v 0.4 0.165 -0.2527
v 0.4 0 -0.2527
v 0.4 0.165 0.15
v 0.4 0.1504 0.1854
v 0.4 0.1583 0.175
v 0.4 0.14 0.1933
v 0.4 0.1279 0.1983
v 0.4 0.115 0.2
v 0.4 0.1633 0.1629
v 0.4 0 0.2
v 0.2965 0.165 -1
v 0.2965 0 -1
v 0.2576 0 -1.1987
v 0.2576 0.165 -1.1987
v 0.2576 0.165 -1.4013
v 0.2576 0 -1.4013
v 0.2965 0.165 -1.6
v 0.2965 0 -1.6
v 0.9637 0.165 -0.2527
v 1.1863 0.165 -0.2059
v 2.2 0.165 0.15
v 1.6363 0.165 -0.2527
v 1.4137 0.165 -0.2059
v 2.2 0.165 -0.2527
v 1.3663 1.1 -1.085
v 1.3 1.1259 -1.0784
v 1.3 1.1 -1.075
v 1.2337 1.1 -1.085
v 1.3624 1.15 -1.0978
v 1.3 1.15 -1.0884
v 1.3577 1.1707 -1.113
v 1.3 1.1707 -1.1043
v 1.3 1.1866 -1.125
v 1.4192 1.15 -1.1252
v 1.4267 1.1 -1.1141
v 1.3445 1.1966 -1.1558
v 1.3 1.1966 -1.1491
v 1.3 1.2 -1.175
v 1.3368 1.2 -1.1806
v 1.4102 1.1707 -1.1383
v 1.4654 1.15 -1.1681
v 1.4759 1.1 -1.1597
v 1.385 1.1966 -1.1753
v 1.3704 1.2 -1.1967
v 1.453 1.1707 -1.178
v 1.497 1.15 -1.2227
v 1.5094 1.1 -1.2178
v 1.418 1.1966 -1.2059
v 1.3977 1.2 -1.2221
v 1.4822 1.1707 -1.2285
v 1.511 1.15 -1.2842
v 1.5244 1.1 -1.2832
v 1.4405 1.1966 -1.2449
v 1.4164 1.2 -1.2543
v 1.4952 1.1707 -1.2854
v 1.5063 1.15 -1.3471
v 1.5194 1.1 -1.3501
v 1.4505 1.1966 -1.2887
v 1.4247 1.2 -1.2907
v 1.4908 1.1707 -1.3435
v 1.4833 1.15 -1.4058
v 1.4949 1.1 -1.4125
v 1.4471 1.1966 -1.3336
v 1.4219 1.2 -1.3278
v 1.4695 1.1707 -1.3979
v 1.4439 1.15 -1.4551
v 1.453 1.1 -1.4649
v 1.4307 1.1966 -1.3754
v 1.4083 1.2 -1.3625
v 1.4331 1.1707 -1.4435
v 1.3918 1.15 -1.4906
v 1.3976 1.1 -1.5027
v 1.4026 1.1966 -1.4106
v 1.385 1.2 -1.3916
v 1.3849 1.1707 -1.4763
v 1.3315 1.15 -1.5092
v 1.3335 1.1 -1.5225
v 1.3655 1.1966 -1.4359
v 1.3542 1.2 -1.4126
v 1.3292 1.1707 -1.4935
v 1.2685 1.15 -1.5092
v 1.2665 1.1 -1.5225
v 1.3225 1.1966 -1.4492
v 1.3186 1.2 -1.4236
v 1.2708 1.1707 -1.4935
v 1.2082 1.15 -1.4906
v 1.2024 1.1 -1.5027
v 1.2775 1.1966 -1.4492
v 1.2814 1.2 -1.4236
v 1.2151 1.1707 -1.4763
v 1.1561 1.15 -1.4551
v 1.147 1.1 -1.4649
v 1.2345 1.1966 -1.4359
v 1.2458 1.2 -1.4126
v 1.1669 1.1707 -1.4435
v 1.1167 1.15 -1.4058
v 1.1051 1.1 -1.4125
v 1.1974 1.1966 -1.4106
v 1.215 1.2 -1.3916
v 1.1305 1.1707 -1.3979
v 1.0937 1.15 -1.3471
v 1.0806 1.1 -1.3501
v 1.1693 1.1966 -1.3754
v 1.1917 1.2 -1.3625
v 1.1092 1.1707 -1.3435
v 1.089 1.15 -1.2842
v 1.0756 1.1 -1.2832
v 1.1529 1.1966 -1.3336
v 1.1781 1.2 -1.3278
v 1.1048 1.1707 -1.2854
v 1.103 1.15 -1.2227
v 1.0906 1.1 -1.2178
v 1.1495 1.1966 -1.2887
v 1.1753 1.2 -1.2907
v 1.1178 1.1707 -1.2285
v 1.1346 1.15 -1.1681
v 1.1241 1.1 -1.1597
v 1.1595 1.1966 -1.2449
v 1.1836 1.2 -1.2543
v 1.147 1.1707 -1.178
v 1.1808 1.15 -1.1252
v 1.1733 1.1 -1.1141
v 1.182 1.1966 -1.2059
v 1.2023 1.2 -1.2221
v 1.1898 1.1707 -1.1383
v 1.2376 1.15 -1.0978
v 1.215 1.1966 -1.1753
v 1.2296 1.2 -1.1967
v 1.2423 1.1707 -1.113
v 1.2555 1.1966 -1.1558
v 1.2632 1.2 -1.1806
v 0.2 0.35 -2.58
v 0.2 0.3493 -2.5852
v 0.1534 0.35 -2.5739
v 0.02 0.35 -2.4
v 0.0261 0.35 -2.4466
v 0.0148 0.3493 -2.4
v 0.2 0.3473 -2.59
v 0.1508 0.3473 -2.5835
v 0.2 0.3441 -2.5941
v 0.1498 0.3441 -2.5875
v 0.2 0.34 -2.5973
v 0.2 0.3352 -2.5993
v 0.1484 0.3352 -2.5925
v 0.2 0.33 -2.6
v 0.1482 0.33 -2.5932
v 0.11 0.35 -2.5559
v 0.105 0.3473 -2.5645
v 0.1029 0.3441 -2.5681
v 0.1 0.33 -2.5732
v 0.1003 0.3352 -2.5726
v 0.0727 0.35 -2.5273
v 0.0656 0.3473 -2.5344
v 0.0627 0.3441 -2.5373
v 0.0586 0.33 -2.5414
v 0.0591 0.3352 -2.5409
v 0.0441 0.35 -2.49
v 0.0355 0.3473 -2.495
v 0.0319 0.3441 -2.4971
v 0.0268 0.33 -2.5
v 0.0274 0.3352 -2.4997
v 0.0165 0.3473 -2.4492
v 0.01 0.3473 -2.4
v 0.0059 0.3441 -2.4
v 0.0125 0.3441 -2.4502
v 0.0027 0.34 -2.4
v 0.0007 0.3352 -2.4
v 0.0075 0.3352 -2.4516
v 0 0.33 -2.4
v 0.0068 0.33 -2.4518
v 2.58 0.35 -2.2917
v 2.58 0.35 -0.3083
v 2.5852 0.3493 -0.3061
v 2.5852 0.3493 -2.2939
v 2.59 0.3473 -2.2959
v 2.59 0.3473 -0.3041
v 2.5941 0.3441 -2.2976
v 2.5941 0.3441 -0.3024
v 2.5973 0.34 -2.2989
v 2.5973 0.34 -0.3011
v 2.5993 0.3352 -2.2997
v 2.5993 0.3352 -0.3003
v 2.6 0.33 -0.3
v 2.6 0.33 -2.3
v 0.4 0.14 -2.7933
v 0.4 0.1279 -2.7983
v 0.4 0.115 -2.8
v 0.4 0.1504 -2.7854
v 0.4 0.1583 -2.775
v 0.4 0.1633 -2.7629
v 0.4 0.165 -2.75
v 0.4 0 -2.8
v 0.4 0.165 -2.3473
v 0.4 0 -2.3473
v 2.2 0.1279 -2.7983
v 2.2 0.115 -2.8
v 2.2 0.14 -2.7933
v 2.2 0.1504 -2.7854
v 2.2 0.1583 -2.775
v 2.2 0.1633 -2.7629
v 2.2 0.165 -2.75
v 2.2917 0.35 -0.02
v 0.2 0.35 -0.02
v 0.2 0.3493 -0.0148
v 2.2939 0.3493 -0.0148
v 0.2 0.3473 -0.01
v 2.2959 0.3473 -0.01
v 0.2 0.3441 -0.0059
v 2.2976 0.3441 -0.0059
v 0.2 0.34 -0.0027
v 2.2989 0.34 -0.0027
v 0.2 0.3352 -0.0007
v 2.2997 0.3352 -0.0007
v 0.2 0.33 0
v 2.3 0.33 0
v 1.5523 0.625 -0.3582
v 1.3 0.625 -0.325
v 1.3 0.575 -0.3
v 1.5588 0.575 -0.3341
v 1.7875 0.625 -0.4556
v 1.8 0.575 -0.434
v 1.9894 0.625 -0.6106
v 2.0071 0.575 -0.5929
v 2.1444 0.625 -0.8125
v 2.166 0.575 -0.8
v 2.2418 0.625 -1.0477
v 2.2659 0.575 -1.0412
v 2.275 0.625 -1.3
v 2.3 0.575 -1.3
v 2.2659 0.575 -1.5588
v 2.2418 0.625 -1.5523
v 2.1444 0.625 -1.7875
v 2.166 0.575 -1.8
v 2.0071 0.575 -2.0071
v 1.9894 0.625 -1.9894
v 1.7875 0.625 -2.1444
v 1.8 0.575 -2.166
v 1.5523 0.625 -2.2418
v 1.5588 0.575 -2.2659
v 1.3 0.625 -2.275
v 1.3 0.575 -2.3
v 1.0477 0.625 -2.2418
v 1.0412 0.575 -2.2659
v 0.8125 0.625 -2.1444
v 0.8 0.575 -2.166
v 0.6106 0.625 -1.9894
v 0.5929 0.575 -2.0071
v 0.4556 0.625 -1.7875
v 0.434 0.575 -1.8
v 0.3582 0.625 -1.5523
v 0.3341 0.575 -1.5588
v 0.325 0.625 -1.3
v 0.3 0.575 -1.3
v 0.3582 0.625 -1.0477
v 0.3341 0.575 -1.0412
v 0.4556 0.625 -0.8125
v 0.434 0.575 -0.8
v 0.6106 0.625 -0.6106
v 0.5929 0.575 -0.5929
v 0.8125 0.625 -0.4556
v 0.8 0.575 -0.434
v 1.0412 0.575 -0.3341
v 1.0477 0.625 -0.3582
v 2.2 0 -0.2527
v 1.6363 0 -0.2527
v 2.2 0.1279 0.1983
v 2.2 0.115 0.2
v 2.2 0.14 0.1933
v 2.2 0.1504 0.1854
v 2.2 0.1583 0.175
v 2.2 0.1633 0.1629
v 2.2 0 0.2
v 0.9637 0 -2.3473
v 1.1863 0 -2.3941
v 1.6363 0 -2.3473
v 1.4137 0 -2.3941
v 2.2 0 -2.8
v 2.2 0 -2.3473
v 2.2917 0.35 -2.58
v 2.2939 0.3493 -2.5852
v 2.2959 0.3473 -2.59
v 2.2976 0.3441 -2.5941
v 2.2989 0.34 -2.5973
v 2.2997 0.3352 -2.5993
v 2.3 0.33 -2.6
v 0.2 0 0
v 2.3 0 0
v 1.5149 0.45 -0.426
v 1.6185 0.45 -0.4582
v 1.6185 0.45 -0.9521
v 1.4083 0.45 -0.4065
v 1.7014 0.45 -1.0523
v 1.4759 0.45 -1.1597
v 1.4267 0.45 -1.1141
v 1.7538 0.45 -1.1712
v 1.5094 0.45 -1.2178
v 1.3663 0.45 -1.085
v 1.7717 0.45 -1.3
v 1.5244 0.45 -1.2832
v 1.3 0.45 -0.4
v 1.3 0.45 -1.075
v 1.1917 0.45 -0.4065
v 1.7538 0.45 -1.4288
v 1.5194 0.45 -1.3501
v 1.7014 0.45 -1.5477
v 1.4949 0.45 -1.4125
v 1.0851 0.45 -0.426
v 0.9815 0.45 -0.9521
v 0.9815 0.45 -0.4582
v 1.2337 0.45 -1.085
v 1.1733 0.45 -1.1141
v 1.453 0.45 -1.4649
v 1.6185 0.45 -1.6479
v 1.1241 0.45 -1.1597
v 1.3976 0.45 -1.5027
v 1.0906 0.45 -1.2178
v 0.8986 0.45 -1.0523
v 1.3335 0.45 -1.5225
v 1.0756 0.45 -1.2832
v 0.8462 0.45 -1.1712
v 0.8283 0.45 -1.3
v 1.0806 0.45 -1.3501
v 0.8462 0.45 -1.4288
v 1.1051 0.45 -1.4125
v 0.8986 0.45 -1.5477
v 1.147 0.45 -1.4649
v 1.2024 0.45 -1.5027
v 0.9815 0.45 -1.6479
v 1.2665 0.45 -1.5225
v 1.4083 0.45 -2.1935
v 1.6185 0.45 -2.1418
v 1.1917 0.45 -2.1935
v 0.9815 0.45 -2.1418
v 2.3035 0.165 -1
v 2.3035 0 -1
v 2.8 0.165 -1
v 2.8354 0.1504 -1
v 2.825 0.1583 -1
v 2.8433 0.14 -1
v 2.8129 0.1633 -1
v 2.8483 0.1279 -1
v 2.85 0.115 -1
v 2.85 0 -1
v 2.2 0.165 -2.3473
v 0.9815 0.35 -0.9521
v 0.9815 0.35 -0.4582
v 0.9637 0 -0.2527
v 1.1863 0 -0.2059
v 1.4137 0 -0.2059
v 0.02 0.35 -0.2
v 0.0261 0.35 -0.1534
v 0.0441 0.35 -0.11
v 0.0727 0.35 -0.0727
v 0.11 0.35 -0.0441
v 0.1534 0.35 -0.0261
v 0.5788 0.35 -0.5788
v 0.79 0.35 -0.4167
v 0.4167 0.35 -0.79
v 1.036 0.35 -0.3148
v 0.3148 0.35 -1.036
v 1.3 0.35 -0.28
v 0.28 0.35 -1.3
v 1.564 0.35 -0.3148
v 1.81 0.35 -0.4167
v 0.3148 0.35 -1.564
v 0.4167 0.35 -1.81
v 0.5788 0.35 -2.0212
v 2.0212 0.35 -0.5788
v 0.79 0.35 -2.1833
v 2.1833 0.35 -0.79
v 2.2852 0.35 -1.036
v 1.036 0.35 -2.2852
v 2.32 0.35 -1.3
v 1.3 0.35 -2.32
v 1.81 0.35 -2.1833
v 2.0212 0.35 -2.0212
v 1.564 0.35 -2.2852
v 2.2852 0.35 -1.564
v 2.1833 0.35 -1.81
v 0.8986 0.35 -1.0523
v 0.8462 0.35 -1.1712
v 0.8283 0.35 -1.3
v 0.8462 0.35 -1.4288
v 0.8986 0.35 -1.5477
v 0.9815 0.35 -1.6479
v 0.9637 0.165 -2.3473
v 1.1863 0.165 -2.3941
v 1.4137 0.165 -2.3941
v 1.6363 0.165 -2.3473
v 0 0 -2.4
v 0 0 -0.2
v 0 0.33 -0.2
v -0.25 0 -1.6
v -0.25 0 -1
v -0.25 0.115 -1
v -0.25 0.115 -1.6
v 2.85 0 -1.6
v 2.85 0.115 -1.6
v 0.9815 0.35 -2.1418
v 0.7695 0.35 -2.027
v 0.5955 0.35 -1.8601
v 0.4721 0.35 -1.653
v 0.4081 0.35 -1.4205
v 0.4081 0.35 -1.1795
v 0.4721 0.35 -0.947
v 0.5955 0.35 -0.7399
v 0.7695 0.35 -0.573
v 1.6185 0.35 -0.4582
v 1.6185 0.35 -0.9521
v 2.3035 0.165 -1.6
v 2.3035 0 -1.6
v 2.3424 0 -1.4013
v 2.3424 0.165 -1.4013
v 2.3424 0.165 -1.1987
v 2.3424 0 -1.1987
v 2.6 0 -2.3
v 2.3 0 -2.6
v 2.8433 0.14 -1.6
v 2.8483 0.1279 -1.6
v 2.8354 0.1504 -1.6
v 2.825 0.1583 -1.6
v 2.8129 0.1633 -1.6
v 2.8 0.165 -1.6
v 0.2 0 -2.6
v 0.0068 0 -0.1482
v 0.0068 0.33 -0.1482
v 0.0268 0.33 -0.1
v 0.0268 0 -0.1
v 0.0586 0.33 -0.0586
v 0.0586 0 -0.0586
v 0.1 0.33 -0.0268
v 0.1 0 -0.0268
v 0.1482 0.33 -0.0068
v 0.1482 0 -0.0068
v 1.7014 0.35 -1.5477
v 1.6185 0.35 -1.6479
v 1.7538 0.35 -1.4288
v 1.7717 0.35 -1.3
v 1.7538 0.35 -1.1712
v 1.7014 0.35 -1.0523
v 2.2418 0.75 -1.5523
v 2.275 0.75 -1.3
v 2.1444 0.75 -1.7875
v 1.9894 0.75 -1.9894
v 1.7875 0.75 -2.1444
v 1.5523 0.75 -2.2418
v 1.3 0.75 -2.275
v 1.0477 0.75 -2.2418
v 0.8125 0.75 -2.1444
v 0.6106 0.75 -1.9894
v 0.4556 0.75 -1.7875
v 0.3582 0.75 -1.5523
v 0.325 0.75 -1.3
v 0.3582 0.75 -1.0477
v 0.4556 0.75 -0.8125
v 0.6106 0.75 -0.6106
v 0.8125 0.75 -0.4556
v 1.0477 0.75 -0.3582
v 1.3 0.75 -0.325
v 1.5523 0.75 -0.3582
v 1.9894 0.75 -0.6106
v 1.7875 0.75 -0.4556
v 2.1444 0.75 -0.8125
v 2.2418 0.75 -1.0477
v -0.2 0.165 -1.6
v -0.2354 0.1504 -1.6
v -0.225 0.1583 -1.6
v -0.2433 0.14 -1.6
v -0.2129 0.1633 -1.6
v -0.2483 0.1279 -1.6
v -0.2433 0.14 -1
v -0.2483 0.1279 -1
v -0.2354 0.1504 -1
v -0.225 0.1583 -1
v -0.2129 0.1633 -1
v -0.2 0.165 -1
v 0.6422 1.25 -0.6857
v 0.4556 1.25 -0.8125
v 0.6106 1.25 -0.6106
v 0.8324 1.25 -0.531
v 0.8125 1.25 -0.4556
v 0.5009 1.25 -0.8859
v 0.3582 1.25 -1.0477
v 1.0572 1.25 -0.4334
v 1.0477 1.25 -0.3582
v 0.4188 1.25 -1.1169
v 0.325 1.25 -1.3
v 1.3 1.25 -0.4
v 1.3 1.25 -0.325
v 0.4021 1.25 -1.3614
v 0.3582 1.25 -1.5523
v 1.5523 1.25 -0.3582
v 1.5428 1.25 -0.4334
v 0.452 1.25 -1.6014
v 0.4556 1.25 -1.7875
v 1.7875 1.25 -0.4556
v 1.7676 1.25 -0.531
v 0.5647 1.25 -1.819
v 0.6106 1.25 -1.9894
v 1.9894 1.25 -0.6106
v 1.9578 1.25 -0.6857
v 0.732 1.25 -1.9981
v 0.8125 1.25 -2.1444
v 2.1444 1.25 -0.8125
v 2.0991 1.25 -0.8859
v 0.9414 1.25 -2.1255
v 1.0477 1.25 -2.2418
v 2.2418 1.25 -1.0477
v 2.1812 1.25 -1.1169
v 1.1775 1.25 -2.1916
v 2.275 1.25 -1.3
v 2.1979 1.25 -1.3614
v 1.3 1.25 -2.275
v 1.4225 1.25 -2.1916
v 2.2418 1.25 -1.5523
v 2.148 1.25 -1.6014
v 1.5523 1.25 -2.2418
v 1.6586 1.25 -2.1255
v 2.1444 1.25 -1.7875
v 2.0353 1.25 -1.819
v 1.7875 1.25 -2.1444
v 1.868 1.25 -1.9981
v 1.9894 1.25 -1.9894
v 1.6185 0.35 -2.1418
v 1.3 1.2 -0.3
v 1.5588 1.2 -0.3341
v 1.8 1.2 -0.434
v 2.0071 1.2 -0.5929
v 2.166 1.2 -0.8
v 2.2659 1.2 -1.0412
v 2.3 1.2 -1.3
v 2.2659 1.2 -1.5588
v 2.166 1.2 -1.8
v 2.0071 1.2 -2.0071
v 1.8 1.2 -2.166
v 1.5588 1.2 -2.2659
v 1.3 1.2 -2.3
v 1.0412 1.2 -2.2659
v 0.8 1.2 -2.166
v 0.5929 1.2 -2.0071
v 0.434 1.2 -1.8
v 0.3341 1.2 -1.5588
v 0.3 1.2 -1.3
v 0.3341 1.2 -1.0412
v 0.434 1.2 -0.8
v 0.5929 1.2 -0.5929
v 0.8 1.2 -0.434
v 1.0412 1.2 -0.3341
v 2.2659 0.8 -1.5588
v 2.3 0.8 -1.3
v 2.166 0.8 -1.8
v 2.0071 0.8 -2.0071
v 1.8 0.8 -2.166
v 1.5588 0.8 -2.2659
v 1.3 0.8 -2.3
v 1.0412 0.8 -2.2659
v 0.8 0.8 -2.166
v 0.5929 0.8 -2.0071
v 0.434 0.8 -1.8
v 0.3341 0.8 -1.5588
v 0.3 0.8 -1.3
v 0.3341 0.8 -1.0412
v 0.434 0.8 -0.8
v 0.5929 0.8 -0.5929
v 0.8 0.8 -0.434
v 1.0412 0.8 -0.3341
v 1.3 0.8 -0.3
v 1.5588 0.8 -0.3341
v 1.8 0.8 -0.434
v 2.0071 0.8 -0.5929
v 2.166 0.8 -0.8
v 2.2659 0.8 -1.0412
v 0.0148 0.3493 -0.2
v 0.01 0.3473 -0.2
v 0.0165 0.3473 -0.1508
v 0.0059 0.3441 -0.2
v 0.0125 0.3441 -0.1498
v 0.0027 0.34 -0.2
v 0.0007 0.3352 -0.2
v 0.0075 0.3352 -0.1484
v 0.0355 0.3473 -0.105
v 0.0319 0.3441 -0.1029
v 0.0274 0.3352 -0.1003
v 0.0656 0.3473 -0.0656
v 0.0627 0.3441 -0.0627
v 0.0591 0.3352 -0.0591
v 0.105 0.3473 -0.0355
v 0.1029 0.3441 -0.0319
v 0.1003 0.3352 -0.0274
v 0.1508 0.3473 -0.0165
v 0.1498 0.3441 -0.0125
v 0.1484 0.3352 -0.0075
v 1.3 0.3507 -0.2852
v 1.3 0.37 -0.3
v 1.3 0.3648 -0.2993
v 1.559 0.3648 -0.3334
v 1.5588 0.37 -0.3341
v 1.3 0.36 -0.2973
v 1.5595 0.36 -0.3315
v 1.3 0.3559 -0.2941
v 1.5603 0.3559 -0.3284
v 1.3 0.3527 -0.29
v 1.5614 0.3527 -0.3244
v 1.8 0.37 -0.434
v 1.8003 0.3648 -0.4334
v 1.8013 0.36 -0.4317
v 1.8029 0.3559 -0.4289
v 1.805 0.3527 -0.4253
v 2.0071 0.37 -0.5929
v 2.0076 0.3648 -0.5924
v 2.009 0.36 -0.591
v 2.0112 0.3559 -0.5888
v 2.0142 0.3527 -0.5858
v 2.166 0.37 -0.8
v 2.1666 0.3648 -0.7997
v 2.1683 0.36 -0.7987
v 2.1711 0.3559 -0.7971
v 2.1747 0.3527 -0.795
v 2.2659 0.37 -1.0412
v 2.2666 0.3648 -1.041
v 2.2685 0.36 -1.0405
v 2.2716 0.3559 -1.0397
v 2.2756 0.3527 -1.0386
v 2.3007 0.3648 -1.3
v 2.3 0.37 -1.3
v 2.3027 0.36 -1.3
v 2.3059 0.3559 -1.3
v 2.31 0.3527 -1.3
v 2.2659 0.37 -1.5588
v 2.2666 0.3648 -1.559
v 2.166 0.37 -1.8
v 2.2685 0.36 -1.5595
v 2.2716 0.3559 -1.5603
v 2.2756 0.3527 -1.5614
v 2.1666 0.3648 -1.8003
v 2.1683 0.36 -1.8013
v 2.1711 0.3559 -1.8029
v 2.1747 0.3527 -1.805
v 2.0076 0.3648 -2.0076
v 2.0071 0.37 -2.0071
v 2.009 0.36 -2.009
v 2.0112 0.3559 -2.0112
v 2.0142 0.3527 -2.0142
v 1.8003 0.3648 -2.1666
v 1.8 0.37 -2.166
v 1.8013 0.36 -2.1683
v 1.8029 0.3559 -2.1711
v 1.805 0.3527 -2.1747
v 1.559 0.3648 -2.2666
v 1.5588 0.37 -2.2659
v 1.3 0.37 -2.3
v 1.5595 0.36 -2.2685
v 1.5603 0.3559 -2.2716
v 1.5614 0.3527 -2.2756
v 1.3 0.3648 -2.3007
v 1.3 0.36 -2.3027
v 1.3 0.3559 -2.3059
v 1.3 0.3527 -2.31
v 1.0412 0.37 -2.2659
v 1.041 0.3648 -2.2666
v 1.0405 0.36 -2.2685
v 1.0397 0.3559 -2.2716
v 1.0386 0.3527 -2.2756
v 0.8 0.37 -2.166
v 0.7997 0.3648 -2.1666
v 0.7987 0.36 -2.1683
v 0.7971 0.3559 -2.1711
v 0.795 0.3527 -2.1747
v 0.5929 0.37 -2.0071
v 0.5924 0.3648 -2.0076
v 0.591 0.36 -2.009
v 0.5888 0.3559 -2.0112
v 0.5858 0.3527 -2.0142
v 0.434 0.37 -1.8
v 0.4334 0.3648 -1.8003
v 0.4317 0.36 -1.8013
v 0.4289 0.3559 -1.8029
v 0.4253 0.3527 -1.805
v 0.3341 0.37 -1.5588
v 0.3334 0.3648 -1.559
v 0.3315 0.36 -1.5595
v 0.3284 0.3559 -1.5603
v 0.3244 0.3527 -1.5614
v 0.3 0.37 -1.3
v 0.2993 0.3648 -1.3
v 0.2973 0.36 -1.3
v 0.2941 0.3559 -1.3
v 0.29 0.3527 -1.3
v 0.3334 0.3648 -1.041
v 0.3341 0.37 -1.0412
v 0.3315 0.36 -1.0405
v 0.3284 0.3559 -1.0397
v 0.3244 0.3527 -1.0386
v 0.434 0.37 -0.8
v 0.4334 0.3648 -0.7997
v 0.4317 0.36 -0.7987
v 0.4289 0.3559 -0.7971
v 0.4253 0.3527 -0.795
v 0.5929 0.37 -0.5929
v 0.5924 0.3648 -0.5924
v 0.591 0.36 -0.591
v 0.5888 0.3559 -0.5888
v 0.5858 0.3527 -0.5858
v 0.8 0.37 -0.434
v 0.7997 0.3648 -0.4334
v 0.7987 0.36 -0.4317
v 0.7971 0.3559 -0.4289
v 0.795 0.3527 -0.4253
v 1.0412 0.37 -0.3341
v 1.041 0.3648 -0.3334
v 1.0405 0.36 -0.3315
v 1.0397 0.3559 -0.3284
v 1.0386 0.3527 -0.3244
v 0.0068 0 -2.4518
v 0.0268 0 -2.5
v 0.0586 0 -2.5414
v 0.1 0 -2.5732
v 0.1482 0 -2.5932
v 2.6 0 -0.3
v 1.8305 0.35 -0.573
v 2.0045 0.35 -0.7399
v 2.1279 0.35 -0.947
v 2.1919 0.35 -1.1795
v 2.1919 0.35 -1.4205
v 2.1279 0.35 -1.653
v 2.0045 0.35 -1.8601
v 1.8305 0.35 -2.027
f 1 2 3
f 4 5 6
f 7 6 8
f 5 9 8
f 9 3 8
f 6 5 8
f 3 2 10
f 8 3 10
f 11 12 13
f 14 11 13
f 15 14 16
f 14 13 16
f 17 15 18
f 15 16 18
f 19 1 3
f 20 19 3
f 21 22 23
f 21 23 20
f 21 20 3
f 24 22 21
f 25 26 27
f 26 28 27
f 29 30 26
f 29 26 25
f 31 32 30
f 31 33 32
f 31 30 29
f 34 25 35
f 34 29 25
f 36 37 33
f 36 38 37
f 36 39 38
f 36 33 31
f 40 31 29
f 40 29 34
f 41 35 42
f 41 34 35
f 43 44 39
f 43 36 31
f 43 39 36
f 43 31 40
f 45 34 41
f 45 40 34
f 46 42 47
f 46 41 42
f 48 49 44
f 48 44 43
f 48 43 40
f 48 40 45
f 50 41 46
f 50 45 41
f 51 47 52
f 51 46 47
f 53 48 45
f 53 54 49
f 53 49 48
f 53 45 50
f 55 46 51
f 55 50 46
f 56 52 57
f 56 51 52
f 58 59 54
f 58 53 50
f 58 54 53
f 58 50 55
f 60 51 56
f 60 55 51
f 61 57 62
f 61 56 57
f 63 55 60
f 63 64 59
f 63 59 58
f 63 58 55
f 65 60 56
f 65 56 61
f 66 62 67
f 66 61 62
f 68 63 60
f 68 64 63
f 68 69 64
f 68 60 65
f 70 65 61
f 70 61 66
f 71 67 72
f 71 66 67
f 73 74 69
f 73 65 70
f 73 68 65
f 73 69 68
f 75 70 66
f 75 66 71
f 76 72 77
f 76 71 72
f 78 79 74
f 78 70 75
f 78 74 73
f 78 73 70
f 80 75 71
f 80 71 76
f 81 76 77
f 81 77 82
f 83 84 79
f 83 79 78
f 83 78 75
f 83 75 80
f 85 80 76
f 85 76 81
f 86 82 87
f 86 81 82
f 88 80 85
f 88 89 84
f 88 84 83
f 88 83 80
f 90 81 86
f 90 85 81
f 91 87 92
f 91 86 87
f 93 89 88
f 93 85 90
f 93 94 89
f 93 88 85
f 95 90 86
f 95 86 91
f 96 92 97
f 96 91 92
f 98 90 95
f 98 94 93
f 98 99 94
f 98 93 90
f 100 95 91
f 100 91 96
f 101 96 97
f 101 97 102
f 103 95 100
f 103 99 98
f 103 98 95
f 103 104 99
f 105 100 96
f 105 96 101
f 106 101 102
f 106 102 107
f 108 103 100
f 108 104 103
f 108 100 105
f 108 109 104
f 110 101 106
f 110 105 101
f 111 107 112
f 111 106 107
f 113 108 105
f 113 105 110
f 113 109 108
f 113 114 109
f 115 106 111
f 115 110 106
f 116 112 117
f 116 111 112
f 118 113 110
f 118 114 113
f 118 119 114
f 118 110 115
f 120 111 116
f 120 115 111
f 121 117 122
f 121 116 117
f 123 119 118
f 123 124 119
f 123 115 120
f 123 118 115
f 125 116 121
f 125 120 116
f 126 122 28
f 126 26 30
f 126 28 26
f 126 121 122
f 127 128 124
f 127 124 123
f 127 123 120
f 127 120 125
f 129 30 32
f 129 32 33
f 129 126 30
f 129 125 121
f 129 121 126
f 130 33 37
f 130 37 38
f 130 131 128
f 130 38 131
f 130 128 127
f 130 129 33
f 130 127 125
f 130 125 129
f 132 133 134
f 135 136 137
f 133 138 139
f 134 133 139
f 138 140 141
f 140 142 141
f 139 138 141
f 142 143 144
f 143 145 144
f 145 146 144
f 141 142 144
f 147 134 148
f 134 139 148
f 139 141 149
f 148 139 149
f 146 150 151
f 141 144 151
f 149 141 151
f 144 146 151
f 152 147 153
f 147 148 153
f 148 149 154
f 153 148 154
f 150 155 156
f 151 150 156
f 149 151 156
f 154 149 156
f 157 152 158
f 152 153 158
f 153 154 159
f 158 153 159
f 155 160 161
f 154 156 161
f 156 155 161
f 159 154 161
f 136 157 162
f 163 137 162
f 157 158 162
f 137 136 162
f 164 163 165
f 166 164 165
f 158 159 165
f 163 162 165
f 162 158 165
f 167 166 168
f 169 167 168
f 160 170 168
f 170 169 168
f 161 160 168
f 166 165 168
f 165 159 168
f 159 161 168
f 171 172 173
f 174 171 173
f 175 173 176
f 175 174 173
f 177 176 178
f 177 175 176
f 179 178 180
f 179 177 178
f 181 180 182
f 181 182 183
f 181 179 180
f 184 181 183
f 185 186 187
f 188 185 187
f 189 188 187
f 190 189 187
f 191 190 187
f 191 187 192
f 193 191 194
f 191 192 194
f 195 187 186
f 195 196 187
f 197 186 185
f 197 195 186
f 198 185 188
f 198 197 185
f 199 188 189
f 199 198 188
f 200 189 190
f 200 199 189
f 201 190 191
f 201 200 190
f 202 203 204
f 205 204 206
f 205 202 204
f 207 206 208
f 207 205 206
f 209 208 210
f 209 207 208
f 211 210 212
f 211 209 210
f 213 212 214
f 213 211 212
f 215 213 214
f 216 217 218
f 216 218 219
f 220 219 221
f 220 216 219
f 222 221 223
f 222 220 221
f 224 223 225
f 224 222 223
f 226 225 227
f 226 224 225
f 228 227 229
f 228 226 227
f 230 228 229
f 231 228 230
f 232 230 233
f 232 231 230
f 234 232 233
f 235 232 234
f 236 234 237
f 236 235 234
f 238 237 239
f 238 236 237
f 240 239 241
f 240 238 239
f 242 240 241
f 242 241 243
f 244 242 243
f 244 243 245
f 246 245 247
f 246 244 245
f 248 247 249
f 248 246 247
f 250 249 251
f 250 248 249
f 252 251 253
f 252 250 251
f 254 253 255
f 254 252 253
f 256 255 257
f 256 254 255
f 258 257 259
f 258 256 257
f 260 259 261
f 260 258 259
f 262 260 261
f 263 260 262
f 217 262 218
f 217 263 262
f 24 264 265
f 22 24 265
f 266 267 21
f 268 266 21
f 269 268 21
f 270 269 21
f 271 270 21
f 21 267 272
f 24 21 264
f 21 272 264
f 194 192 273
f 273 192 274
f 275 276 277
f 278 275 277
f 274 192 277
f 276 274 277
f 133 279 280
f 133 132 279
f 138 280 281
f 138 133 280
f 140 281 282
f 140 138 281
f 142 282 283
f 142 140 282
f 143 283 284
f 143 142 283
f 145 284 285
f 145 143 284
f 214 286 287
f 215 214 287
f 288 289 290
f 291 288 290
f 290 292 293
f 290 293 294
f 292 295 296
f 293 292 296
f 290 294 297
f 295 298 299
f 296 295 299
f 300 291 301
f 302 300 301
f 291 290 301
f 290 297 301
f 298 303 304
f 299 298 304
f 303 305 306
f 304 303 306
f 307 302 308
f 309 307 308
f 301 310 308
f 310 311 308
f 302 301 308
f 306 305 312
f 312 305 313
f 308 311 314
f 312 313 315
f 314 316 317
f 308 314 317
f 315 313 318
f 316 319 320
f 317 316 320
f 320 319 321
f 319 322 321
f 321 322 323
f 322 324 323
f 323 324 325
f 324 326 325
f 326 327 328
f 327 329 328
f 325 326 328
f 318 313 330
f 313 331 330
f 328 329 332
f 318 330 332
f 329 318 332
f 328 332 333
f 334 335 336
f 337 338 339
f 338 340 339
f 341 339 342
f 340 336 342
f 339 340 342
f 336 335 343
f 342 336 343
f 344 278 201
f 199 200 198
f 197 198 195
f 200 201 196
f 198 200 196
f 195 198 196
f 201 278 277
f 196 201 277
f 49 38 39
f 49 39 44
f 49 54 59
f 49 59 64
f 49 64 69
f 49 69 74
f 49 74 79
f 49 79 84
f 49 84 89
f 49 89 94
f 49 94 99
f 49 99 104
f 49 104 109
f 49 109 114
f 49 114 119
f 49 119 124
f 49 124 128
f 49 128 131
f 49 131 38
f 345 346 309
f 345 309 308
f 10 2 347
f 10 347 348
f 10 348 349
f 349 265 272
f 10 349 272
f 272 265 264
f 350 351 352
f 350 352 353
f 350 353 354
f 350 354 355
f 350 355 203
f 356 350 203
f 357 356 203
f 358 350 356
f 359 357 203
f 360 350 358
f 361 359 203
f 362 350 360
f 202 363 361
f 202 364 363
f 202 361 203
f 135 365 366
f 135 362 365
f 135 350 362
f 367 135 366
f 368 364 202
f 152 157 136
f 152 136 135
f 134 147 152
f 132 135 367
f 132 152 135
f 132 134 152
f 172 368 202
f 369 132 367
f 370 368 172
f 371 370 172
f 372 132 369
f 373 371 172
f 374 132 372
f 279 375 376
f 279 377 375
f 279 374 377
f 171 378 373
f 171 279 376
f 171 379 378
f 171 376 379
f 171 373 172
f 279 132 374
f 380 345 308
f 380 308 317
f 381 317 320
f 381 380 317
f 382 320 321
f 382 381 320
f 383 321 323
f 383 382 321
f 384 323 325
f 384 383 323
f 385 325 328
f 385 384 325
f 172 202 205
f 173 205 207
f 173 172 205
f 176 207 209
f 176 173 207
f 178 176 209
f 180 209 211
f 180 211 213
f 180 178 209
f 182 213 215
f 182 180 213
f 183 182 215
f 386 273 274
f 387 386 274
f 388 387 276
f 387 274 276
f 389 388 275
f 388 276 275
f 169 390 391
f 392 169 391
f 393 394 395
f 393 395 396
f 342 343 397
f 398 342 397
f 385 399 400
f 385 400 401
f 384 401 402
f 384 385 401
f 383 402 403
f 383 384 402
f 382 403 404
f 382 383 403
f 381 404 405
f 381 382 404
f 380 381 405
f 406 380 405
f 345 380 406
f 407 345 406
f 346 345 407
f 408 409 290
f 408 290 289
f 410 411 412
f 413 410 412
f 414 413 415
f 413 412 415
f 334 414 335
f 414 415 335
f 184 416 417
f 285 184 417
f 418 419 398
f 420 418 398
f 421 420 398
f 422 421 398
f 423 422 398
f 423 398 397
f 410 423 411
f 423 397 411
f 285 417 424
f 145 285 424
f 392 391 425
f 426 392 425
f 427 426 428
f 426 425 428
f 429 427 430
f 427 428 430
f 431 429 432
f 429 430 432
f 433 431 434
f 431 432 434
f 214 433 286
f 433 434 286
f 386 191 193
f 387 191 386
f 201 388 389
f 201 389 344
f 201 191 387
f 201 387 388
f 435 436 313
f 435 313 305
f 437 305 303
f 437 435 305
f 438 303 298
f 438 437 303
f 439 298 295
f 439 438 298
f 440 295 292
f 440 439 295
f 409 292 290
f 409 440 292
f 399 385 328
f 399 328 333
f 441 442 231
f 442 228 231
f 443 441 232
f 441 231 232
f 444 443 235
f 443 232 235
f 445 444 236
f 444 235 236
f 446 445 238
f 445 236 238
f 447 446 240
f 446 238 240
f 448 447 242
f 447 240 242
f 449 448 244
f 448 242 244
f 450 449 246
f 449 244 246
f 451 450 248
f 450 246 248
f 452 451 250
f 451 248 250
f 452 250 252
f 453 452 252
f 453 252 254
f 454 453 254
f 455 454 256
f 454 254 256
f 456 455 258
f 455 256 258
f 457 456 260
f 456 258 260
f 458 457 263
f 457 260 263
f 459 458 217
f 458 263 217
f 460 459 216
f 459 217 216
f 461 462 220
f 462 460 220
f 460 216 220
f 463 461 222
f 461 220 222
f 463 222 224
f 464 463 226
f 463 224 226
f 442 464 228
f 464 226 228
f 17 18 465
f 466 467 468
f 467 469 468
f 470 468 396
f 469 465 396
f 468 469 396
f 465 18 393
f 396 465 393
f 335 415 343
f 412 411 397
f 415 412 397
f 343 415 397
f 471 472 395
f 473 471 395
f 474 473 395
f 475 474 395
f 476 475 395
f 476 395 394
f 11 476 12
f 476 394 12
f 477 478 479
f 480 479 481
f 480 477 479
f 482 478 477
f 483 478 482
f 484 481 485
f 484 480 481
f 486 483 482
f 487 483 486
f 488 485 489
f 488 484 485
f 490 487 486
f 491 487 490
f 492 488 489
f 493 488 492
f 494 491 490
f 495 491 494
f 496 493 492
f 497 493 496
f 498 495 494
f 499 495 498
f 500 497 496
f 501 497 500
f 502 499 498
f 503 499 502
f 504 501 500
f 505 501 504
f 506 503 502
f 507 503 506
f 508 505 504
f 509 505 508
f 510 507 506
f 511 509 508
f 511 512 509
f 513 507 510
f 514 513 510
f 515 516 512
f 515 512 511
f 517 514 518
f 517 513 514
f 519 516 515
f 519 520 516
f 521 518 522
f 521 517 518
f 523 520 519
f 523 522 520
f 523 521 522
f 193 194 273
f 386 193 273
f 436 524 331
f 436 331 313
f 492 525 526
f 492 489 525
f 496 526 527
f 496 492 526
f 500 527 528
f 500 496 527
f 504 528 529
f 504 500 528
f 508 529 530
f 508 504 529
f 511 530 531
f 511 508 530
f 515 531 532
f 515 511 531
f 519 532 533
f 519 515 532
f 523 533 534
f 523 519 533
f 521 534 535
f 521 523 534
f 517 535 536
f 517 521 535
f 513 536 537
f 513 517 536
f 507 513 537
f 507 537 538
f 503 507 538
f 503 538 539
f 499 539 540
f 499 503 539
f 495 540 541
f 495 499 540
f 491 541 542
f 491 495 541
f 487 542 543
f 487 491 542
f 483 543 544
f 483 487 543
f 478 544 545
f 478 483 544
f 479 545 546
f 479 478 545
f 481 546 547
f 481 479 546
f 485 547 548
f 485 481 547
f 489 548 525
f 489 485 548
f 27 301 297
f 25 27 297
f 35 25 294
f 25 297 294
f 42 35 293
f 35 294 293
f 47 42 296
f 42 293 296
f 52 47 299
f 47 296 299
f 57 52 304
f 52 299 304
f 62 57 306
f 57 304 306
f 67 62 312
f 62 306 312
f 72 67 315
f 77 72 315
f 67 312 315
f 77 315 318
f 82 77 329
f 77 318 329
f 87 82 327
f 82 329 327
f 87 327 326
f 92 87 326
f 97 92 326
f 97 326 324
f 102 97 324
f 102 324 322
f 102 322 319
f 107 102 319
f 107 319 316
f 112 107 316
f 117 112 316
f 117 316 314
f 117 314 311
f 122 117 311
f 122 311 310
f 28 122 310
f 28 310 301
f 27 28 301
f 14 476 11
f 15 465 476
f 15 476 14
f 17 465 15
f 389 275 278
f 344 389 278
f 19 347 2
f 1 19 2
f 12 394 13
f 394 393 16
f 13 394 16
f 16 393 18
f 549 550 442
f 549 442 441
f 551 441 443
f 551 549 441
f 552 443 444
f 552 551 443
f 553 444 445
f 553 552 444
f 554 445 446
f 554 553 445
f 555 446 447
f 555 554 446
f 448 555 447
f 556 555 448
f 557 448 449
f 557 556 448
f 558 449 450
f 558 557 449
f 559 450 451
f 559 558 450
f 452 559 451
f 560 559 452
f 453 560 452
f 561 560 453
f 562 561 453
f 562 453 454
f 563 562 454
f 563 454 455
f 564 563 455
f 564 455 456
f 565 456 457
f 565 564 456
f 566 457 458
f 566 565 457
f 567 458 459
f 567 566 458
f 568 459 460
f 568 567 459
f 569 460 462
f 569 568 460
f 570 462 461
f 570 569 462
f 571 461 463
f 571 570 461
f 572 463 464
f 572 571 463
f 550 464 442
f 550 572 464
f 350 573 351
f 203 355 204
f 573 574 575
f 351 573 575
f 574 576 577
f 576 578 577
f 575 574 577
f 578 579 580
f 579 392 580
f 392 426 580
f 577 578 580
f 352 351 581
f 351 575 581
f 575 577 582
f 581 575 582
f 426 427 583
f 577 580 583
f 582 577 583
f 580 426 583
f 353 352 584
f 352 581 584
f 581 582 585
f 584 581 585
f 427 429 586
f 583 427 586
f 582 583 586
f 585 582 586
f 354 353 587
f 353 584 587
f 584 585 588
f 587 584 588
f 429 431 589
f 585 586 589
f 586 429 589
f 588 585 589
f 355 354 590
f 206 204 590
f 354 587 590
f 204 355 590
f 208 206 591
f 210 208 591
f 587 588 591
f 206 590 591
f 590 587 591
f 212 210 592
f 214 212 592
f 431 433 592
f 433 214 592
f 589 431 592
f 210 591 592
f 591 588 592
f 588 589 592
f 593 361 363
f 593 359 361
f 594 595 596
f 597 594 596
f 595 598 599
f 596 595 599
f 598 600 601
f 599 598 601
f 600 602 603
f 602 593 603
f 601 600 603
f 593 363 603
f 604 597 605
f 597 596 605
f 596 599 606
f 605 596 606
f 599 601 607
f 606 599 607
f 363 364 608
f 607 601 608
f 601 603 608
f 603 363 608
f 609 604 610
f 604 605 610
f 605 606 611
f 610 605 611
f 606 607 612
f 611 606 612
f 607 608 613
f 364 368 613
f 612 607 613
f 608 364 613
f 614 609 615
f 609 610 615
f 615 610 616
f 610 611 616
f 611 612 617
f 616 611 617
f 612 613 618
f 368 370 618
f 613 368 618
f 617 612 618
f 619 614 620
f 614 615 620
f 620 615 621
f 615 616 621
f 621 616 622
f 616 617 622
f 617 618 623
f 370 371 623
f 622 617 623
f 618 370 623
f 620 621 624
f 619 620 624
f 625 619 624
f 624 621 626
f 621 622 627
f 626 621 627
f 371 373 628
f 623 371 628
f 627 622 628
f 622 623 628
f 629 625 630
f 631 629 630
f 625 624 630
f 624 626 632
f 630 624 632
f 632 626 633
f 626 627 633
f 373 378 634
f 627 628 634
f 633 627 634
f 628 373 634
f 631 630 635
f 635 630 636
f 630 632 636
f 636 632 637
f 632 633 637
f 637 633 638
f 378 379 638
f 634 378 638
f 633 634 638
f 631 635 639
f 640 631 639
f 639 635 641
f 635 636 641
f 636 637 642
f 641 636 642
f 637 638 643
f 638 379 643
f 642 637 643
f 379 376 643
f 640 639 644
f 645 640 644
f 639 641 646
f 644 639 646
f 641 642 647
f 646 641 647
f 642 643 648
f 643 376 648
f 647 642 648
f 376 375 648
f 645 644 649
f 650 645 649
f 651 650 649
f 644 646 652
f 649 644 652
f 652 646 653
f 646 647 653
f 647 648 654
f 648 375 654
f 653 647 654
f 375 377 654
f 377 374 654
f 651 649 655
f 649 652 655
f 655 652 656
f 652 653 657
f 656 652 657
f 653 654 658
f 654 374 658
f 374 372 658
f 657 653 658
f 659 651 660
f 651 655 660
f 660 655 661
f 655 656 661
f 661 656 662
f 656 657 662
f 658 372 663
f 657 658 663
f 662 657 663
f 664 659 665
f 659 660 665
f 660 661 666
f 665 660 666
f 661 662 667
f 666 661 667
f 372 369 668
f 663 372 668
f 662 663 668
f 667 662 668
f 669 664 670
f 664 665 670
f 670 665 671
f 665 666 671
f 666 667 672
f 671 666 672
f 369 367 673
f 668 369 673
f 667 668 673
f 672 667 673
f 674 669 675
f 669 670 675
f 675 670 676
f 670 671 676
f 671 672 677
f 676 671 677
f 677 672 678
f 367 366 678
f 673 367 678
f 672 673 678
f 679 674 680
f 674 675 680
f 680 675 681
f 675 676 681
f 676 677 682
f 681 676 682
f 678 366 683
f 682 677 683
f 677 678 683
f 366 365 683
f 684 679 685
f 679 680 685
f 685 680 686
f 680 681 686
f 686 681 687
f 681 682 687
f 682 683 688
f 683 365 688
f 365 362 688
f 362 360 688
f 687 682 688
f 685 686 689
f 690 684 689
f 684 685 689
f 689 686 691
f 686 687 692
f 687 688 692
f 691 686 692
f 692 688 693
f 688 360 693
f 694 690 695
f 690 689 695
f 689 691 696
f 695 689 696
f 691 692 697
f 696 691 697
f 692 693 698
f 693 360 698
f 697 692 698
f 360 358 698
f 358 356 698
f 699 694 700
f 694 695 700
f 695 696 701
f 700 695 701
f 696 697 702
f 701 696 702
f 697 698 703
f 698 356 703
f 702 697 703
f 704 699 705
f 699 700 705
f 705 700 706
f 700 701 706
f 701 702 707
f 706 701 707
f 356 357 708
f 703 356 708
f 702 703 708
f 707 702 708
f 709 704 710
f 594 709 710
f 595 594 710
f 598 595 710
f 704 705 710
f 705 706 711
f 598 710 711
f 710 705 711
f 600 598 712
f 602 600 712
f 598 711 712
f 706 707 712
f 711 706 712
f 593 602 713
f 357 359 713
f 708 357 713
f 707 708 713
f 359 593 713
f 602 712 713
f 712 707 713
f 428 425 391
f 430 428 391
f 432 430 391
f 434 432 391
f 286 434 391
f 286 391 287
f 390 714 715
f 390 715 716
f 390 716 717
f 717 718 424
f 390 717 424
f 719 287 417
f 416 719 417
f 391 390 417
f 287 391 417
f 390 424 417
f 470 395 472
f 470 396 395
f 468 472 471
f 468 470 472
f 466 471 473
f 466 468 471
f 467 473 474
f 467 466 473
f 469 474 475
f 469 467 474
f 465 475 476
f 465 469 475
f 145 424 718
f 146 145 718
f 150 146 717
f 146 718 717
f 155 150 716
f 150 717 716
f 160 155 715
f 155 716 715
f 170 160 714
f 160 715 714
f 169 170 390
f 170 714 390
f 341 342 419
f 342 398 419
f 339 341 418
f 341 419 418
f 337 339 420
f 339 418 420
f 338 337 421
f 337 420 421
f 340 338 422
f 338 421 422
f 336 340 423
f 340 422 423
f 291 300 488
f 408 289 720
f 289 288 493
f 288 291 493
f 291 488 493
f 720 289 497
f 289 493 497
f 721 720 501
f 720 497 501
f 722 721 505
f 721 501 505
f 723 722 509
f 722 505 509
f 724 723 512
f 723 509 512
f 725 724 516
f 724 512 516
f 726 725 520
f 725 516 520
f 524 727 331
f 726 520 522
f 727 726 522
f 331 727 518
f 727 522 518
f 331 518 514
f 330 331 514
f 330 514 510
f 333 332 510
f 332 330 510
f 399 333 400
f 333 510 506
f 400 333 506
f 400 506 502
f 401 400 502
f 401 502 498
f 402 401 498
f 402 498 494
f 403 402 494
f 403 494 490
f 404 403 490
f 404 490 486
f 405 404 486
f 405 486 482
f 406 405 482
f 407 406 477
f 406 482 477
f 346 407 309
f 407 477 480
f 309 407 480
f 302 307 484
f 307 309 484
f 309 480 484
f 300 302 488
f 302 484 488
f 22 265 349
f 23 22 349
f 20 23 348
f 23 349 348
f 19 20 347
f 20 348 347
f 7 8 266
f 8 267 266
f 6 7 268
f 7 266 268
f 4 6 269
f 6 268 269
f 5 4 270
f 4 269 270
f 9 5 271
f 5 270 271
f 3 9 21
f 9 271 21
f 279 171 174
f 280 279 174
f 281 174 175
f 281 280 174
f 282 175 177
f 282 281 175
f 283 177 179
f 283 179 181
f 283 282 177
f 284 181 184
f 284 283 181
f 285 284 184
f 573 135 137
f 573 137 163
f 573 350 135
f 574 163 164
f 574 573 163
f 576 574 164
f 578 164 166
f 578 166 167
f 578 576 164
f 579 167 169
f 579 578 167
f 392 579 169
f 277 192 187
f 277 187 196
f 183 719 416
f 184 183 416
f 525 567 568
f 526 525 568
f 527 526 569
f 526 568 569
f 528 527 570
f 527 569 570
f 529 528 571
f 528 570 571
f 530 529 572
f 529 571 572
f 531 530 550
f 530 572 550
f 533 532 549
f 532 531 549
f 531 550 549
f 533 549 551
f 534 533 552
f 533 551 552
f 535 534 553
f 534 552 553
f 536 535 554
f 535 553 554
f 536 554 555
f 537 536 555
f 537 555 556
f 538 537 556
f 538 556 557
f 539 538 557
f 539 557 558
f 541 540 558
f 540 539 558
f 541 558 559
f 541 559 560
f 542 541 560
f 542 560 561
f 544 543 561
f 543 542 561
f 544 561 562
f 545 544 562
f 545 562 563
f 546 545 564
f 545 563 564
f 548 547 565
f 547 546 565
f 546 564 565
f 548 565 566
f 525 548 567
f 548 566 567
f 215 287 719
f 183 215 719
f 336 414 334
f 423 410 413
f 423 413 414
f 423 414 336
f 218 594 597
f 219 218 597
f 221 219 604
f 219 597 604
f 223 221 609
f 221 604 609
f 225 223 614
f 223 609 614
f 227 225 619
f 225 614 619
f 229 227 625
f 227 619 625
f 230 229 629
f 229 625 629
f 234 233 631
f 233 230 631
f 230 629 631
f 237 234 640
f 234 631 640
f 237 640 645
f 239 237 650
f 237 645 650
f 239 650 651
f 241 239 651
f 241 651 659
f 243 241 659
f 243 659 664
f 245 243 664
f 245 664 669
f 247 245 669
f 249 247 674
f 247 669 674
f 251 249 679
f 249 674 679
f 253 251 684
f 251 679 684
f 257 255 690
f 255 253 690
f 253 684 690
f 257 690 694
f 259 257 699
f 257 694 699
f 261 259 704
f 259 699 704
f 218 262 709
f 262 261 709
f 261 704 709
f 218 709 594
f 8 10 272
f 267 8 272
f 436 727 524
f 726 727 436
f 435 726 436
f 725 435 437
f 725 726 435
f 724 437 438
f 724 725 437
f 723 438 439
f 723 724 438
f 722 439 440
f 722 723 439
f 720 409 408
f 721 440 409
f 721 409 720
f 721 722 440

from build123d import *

# Parameters (mm, degrees)
SKETCH1_W           = 1.8
SKETCH1_H           = 0.2
SKETCH1_W_2         = 0.25
SKETCH1_H_2         = 0.6
BOSS_EXTRUDE1_DEPTH = 0.165
BOSS_EXTRUDE2_DEPTH = 0.35
SKETCH2_R           = 1
BOSS_EXTRUDE3_DEPTH = 0.225
SKETCH4_R           = 0.975
SKETCH5_R           = 0.975
SKETCH6_R           = 1
SKETCH7_R           = 1
BOSS_EXTRUDE4_DEPTH = 0.4
SKETCH8_R           = 0.975
SKETCH9_R           = 0.9
CUT_EXTRUDE1_DEPTH  = 0.9
SKETCH10_R          = 0.225
BOSS_EXTRUDE5_DEPTH = 0.85
BOSS_EXTRUDE6_DEPTH = 0.1
FILLET1_R           = 0.05
FILLET2_R           = 0.05
FILLET3_R           = 0.05
FILLET4_R           = 0.05
FILLET5_R           = 0.02
FILLET6_R           = 0.1


# Read off the part's stored shape, not the designer's step: Boss-Extrude2
with BuildPart() as part:
    # Sketch1 → Boss-Extrude1 (new body)
    with BuildSketch(Plane(origin=(0, 0, 0), x_dir=(1, 0, 0), z_dir=(0, 1, 0))):
        with Locations((1.3, -0.1)):
            Rectangle(SKETCH1_W, SKETCH1_H)
        with Locations((2.725, 1.3)):
            Rectangle(SKETCH1_W_2, SKETCH1_H_2)
        with Locations((1.3, 2.7)):
            Rectangle(SKETCH1_W, SKETCH1_H)
        with Locations((-0.125, 1.3)):
            Rectangle(SKETCH1_W_2, SKETCH1_H_2)
        with BuildLine():
            Line((2.303450249, 1), (2.6, 1))
            Line((2.6, 1), (2.6, 1.6))
            Line((2.6, 1.6), (2.303450249, 1.6))
            ThreePointArc((2.303450249, 1.6), (2.347335859, 1.3), (2.303450249, 1))
        make_face()
        with BuildLine():
            Line((2.2, 2.6), (0.4, 2.6))
            Line((0.4, 2.6), (0.4, 2.347335859))
            Line((0.4, 2.347335859), (0.963715005, 2.347335859))
            ThreePointArc((0.963715005, 2.347335859), (1.3, 2.4), (1.636284995, 2.347335859))
            Line((1.636284995, 2.347335859), (2.2, 2.347335859))
            Line((2.2, 2.347335859), (2.2, 2.6))
        make_face()
        with BuildLine():
            Line((0.4, 0.252664141), (0.4, 0))
            Line((0.4, 0), (2.2, 0))
            Line((2.2, 0), (2.2, 0.252664141))
            Line((2.2, 0.252664141), (1.636284995, 0.252664141))
            ThreePointArc((1.636284995, 0.252664141), (1.3, 0.2), (0.963715005, 0.252664141))
            Line((0.963715005, 0.252664141), (0.4, 0.252664141))
        make_face()
        with BuildLine():
            Line((0, 1.6), (0, 1))
            Line((0, 1), (0.296549751, 1))
            ThreePointArc((0.296549751, 1), (0.252664141, 1.3), (0.296549751, 1.6))
            Line((0.296549751, 1.6), (0, 1.6))
        make_face()
    extrude(amount=BOSS_EXTRUDE1_DEPTH)

    # Fillet1
    fillet1_edges = [part.edges().sort_by_distance(p)[0] for p in [
        (1.3, 0.165, -2.8),
    ]]
    fillet(fillet1_edges, radius=FILLET1_R)

    # Fillet2
    fillet2_edges = [part.edges().sort_by_distance(p)[0] for p in [
        (2.85, 0.165, -1.3),
    ]]
    fillet(fillet2_edges, radius=FILLET2_R)

    # Fillet3
    fillet3_edges = [part.edges().sort_by_distance(p)[0] for p in [
        (-0.25, 0.165, -1.3),
    ]]
    fillet(fillet3_edges, radius=FILLET3_R)

    # Fillet4
    fillet4_edges = [part.edges().sort_by_distance(p)[0] for p in [
        (1.3, 0.165, 0.2),
    ]]
    fillet(fillet4_edges, radius=FILLET4_R)


with BuildPart() as body_2:
    # Boss-Extrude2 outline → Boss-Extrude2 (new body)
    with BuildSketch(Plane(origin=(0, 0, 0), x_dir=(1, 0, 0), z_dir=(0, 1, 0))):
        with BuildLine():
            Line((0.2, 0), (2.3, 0))
            Line((2.3, 0), (2.6, 0.3))
            Line((2.6, 0.3), (2.6, 2.3))
            Line((2.6, 2.3), (2.3, 2.6))
            Line((2.3, 2.6), (0.2, 2.6))
            ThreePointArc((0.2, 2.6), (0.058578644, 2.541421356), (0, 2.4))
            Line((0, 2.4), (0, 0.2))
            ThreePointArc((0, 0.2), (0.058578644, 0.058578644), (0.2, 0))
        make_face()
    extrude(amount=BOSS_EXTRUDE2_DEPTH)

    # Sketch2 → Boss-Extrude3 (add)
    with BuildSketch(Plane(origin=(0, 0.35, 0), x_dir=(1, 0, 0), z_dir=(0, 1, 0))):
        with Locations(Location((1.3, 1.3, 0), (0, 0, 270))):
            Circle(SKETCH2_R)
    extrude(amount=BOSS_EXTRUDE3_DEPTH)

    # Sketch4 → section 1 of loft1
    with BuildSketch(Plane(origin=(0, 0.625, 0), x_dir=(1, 0, 0), z_dir=(0, 1, 0)), mode=Mode.PRIVATE) as loft1_s1:
        with Locations((1.3, 1.3)):
            Circle(SKETCH4_R)
    # loft up to a face of the part (loft1)
    loft([Face(Wire([body_2.edges().sort_by_distance((2.028968627, 0.575, -1.984547106))[0]])), loft1_s1.sketch])

    # Sketch5 → section 0 of loft2
    with BuildSketch(Plane(origin=(0, 0.75, 0), x_dir=(1, 0, 0), z_dir=(0, 1, 0)), mode=Mode.PRIVATE) as loft2_s0:
        with Locations((1.3, 1.3)):
            Circle(SKETCH5_R)
    # loft up to a face of the part (loft2)
    loft([loft2_s0.sketch, Face(Wire([body_2.edges().sort_by_distance((2.010744412, 0.625, -1.967433428))[0]]))])

    # Sketch6 → section 1 of loft3
    with BuildSketch(Plane(origin=(0, 0.8, 0), x_dir=(1, 0, 0), z_dir=(0, 1, 0)), mode=Mode.PRIVATE) as loft3_s1:
        with Locations((1.3, 1.3)):
            Circle(SKETCH6_R)
    # loft up to a face of the part (loft3)
    loft([Face(Wire([body_2.edges().sort_by_distance((0.632566572, 0.75, -2.010744412))[0]])), loft3_s1.sketch])

    # Sketch7 → Boss-Extrude4 (add)
    with BuildSketch(Plane(origin=(0, 0.8, 0), x_dir=(1, 0, 0), z_dir=(0, 1, 0))):
        with Locations(Location((1.3, 1.3, 0), (0, 0, 270))):
            Circle(SKETCH7_R)
    extrude(amount=BOSS_EXTRUDE4_DEPTH)

    # Sketch8 → section 1 of loft5
    with BuildSketch(Plane(origin=(0, 1.25, 0), x_dir=(1, 0, 0), z_dir=(0, 1, 0)), mode=Mode.PRIVATE) as loft5_s1:
        with Locations((1.3, 1.3)):
            Circle(SKETCH8_R)
    # loft up to a face of the part (loft5)
    loft([Face(Wire([body_2.edges().sort_by_distance((2.028968627, 1.2, -1.984547106))[0]])), loft5_s1.sketch])

    # Sketch9 → Cut-Extrude1 (cut)
    with BuildSketch(Plane(origin=(0, 1.25, 0), x_dir=(1, 0, 0), z_dir=(0, 1, 0))):
        with Locations(Location((1.3, 1.3, 0), (0, 0, 270))):
            Circle(SKETCH9_R)
    extrude(amount=-CUT_EXTRUDE1_DEPTH, mode=Mode.SUBTRACT)

    # Sketch10 → Boss-Extrude5 (add)
    with BuildSketch(Plane(origin=(0, 0.35, 0), x_dir=(1, 0, 0), z_dir=(0, 1, 0))):
        with Locations(Location((1.3, 1.3, 0), (0, 0, 270))):
            Circle(SKETCH10_R)
    extrude(amount=BOSS_EXTRUDE5_DEPTH)

    # Sketch11 → Boss-Extrude6 (add)
    with BuildSketch(Plane(origin=(0, 0.35, 0), x_dir=(1, 0, 0), z_dir=(0, 1, 0))):
        with BuildLine():
            Line((1.618502888, 0.952098493), (1.618502888, 0.458242368))
            ThreePointArc((1.618502888, 0.458242368), (1.3, 0.4), (0.981497112, 0.458242368))
            Line((0.981497112, 0.458242368), (0.981497112, 0.952098493))
            ThreePointArc((0.981497112, 0.952098493), (0.828322623, 1.3), (0.981497112, 1.647901507))
            Line((0.981497112, 1.647901507), (0.981497112, 2.141757632))
            ThreePointArc((0.981497112, 2.141757632), (1.3, 2.2), (1.618502888, 2.141757632))
            Line((1.618502888, 2.141757632), (1.618502888, 1.647901507))
            ThreePointArc((1.618502888, 1.647901507), (1.771677377, 1.3), (1.618502888, 0.952098493))
        make_face()
    extrude(amount=BOSS_EXTRUDE6_DEPTH)

    # Fillet5
    fillet5_edges = [body_2.edges().sort_by_distance(p)[0] for p in [
        (2.45, 0.35, -0.15),
        (2.6, 0.35, -1.3),
        (2.45, 0.35, -2.45),
        (1.25, 0.35, -2.6),
        (0.058578644, 0.35, -2.541421356),
        (1.3, 0.35, -2.3),
        (1.25, 0.35, 0),
        (0, 0.35, -1.3),
        (0.058578644, 0.35, -0.058578644),
    ]]
    fillet(fillet5_edges, radius=FILLET5_R)

    # Fillet6
    fillet6_edges = [body_2.edges().sort_by_distance(p)[0] for p in [
        (1.3, 1.2, -1.525),
    ]]
    fillet(fillet6_edges, radius=FILLET6_R)


solid = Compound([part.part, body_2.part])
